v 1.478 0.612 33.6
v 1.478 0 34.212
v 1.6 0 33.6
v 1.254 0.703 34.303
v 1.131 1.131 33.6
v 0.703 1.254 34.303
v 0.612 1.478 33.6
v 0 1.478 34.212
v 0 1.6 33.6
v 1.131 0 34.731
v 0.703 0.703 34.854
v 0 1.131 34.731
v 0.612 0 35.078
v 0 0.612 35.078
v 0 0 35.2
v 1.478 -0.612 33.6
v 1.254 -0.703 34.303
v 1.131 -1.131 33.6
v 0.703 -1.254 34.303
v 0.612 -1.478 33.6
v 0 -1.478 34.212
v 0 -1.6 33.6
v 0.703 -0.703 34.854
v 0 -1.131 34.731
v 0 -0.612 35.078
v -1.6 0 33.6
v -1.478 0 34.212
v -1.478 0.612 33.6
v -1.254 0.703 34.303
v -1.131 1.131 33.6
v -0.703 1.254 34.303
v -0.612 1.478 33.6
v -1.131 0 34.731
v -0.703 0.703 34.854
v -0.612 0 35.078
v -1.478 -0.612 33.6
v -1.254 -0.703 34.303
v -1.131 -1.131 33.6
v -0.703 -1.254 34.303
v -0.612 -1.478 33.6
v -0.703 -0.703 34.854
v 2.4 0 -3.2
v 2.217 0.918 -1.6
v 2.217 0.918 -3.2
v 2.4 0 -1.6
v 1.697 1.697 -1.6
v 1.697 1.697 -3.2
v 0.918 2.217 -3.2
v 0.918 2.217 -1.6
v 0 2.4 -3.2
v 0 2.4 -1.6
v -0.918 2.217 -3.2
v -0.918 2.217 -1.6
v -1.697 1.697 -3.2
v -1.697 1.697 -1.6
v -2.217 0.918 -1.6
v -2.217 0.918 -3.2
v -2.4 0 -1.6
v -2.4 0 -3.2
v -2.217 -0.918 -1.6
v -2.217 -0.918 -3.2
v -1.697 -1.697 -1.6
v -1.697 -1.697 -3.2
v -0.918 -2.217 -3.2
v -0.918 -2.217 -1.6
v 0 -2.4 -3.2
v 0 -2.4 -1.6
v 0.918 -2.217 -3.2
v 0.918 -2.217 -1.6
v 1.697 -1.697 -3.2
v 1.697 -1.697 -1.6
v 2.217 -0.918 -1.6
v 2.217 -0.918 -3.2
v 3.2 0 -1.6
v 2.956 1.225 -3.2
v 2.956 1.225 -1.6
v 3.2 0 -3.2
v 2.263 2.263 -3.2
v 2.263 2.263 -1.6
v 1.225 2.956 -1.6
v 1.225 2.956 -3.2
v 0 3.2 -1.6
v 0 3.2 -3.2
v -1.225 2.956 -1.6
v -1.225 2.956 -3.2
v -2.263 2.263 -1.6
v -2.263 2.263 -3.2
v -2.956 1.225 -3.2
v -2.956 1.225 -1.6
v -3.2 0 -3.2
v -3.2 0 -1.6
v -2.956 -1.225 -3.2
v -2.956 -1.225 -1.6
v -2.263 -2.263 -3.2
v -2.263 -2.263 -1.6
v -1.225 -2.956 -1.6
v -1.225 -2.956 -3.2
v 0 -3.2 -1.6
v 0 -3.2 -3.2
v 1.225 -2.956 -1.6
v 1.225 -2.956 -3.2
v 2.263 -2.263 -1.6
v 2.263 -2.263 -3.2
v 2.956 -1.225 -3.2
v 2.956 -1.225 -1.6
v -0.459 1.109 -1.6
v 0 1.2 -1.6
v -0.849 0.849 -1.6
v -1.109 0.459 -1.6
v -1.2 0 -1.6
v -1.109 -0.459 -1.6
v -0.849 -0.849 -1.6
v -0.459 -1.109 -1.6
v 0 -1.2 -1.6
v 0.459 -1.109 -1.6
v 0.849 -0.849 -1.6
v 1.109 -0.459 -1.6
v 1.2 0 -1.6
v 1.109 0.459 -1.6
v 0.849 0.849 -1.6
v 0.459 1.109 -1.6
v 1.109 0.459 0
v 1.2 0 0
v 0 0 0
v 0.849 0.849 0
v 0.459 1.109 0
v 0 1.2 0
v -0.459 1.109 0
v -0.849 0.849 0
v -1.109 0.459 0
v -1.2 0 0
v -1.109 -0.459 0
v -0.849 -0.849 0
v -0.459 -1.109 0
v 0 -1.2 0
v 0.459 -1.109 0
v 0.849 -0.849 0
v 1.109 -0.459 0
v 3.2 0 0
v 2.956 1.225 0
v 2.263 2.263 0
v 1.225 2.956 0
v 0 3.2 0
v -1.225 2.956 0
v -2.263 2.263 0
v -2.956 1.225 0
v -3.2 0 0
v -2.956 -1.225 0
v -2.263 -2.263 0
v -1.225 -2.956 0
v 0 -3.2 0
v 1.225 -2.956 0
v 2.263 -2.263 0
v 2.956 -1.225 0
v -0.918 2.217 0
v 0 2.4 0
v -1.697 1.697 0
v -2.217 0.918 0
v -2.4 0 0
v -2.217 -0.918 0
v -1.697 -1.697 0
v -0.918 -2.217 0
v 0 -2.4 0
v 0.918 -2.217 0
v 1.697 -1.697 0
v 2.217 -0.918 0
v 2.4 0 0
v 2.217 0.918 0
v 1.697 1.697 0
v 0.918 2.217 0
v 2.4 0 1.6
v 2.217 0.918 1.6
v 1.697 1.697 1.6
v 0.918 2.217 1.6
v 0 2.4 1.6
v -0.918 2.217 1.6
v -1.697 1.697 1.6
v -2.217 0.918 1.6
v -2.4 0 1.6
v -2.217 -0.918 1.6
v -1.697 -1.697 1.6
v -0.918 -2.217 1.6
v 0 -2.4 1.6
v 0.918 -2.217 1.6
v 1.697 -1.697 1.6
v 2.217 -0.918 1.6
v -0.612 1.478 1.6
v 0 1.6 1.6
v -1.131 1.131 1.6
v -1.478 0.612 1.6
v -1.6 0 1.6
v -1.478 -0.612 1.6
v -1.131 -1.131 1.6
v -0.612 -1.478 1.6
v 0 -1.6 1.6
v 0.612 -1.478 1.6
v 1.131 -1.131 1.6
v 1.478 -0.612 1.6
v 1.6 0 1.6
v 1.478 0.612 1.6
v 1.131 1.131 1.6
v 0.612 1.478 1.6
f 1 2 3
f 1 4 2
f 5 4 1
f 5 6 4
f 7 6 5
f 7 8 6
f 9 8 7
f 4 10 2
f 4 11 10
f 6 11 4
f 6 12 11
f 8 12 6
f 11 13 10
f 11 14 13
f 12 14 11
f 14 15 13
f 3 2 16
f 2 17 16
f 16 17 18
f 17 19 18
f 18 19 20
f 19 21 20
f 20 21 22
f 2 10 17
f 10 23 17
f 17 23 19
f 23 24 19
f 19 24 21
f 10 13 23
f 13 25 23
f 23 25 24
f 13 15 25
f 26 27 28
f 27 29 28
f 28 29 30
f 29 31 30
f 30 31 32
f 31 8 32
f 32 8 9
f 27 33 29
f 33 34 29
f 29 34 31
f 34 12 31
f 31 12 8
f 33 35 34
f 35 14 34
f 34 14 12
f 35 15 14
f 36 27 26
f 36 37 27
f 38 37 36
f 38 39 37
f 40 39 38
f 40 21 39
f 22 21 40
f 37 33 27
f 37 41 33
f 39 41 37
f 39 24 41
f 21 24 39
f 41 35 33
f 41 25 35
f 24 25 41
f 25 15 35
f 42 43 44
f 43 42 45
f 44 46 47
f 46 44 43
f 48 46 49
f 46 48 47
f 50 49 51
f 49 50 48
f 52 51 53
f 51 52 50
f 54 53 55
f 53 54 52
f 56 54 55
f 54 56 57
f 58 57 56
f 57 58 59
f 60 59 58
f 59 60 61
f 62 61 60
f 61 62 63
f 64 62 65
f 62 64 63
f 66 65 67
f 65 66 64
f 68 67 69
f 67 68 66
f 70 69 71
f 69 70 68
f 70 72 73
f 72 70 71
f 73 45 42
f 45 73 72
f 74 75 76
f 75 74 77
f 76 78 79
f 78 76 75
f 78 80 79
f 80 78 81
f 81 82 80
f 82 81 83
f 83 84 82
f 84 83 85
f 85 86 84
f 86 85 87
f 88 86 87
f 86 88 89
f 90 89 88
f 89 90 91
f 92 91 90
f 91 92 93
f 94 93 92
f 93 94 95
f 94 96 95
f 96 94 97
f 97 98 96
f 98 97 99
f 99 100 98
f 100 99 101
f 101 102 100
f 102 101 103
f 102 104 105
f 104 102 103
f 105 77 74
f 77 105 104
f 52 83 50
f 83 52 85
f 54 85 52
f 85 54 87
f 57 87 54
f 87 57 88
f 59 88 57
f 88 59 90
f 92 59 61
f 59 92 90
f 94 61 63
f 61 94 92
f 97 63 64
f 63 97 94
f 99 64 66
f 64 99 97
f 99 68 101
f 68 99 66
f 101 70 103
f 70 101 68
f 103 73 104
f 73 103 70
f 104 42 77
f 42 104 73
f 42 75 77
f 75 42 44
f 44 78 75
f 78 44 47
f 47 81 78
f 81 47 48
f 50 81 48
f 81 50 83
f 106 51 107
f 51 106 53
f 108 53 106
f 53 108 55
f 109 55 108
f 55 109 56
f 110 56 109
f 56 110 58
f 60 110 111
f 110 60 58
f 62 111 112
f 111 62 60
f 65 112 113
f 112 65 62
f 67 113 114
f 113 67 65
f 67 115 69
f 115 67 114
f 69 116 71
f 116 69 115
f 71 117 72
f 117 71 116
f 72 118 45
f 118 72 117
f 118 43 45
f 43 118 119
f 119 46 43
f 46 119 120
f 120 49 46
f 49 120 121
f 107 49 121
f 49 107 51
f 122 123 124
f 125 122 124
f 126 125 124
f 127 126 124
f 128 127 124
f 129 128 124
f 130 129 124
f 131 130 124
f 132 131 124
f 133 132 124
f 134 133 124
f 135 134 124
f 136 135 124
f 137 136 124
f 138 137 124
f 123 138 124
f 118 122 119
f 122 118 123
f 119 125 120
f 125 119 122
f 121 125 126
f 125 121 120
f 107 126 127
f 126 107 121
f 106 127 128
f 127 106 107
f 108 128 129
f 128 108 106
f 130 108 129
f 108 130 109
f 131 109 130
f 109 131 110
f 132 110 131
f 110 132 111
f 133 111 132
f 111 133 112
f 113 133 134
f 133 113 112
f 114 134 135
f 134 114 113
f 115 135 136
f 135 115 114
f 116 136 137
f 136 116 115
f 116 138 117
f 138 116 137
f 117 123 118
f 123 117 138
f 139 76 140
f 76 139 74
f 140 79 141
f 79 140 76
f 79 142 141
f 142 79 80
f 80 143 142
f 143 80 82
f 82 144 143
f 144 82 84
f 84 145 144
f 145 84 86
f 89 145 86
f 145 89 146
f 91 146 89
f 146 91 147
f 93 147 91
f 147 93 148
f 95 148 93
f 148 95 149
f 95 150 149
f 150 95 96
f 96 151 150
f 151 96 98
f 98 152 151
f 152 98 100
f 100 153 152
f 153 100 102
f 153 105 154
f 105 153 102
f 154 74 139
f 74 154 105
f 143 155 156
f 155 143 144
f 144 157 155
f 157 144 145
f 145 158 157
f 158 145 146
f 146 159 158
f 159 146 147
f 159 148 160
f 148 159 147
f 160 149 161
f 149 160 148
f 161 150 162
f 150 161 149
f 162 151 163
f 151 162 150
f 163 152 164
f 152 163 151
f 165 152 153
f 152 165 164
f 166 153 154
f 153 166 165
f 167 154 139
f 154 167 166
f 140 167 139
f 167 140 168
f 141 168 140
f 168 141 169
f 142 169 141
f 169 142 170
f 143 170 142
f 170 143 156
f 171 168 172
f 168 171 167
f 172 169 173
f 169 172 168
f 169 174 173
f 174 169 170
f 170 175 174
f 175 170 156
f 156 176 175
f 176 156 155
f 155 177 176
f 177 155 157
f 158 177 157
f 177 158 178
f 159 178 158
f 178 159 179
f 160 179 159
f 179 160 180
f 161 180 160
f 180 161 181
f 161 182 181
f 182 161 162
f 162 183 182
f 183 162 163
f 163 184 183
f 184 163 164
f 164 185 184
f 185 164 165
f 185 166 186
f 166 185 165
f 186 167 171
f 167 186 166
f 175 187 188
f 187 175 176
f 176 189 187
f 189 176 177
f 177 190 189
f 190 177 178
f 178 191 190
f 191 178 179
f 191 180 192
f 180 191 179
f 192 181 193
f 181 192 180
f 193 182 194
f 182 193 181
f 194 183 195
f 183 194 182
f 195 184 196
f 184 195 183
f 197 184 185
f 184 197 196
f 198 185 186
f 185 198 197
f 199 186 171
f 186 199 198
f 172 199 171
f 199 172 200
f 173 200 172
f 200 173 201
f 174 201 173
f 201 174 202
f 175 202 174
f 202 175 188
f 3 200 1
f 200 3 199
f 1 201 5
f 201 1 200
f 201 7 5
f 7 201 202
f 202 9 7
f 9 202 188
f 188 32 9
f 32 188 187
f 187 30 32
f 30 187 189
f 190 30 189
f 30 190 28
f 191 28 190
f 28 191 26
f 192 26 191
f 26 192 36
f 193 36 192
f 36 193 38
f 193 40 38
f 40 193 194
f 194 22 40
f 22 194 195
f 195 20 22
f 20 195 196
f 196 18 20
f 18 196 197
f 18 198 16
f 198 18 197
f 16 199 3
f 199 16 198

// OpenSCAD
// file: ../p/1-8sphe.scad
use <../lib.scad>
function ldraw_lib__1_8sphe() = [
// 0 Sphere 0.125
// 0 Name: 1-8sphe.dat
// 0 Author: James Jessiman
// 0 !LDRAW_ORG Primitive UPDATE 2012-03
// 0 !LICENSE Licensed under CC BY 2.0 and CC BY 4.0 : see CAreadme.txt
// 
// 0 BFC CERTIFY CCW
  [0,"BFC","CERTIFY"],
  [0,"BFC","CCW"],
// 
// 0 !HISTORY 2000-08-01 {Axel Poque} fixes to resolve L3P error messages.
// 0 !HISTORY 2000-08-01 {Manfred Moolhuysen} fixes to resolve L3P error messages.
// 0 !HISTORY 2000-09-30 [PTadmin] Official Update 2000-02
// 0 !HISTORY 2002-03-28 [hafhead] Made BFC compliant
// 0 !HISTORY 2002-04-25 [PTadmin] Official Update 2002-02
// 0 !HISTORY 2007-06-22 [PTadmin] Header formatted for Contributor Agreement
// 0 !HISTORY 2008-07-01 [PTadmin] Official Update 2008-01
// 0 !HISTORY 2010-09-12 [MagFors] Changed winding, removed duplicated cond-line, optimized filesize
// 0 !HISTORY 2010-12-31 [PTadmin] Official Update 2010-03
// 0 !HISTORY 2012-07-01 [tcobbs] Replaced with geometry from LDView
// 0 !HISTORY 2012-12-28 [PTadmin] Official Update 2012-03
// 
// 
// 3 16 1 0 0 0.9239 0.3827 0 0.9239 0 0.3827
  [3,16,1,0,0,0.9239,0.3827,0,0.9239,0,0.3827],
// 3 16 0.9239 0.3827 0 0.7836 0.4393 0.4393 0.9239 0 0.3827
  [3,16,0.9239,0.3827,0,0.7836,0.4393,0.4393,0.9239,0,0.3827],
// 3 16 0.9239 0 0.3827 0.7836 0.4393 0.4393 0.7071 0 0.7071
  [3,16,0.9239,0,0.3827,0.7836,0.4393,0.4393,0.7071,0,0.7071],
// 3 16 0.7836 0.4393 0.4393 0.4393 0.4393 0.7836 0.7071 0 0.7071
  [3,16,0.7836,0.4393,0.4393,0.4393,0.4393,0.7836,0.7071,0,0.7071],
// 3 16 0.7071 0 0.7071 0.4393 0.4393 0.7836 0.3827 0 0.9239
  [3,16,0.7071,0,0.7071,0.4393,0.4393,0.7836,0.3827,0,0.9239],
// 3 16 0.4393 0.4393 0.7836 0 0.3827 0.9239 0.3827 0 0.9239
  [3,16,0.4393,0.4393,0.7836,0,0.3827,0.9239,0.3827,0,0.9239],
// 3 16 0.3827 0 0.9239 0 0.3827 0.9239 0 0 1
  [3,16,0.3827,0,0.9239,0,0.3827,0.9239,0,0,1],
// 3 16 0.9239 0.3827 0 0.7071 0.7071 0 0.7836 0.4393 0.4393
  [3,16,0.9239,0.3827,0,0.7071,0.7071,0,0.7836,0.4393,0.4393],
// 3 16 0.7071 0.7071 0 0.4393 0.7836 0.4393 0.7836 0.4393 0.4393
  [3,16,0.7071,0.7071,0,0.4393,0.7836,0.4393,0.7836,0.4393,0.4393],
// 3 16 0.7836 0.4393 0.4393 0.4393 0.7836 0.4393 0.4393 0.4393 0.7836
  [3,16,0.7836,0.4393,0.4393,0.4393,0.7836,0.4393,0.4393,0.4393,0.7836],
// 3 16 0.4393 0.7836 0.4393 0 0.7071 0.7071 0.4393 0.4393 0.7836
  [3,16,0.4393,0.7836,0.4393,0,0.7071,0.7071,0.4393,0.4393,0.7836],
// 3 16 0.4393 0.4393 0.7836 0 0.7071 0.7071 0 0.3827 0.9239
  [3,16,0.4393,0.4393,0.7836,0,0.7071,0.7071,0,0.3827,0.9239],
// 3 16 0.7071 0.7071 0 0.3827 0.9239 0 0.4393 0.7836 0.4393
  [3,16,0.7071,0.7071,0,0.3827,0.9239,0,0.4393,0.7836,0.4393],
// 3 16 0.3827 0.9239 0 0 0.9239 0.3827 0.4393 0.7836 0.4393
  [3,16,0.3827,0.9239,0,0,0.9239,0.3827,0.4393,0.7836,0.4393],
// 3 16 0.4393 0.7836 0.4393 0 0.9239 0.3827 0 0.7071 0.7071
  [3,16,0.4393,0.7836,0.4393,0,0.9239,0.3827,0,0.7071,0.7071],
// 3 16 0.3827 0.9239 0 0 1 0 0 0.9239 0.3827
  [3,16,0.3827,0.9239,0,0,1,0,0,0.9239,0.3827],
// 
// 5 24 1 0 0 0.9239 0.3827 0 1 0 -0.1 0.9239 0 0.3827
  [5,24,1,0,0,0.9239,0.3827,0,1,0,-0.1,0.9239,0,0.3827],
// 5 24 0.9239 0.3827 0 0.9239 0 0.3827 1 0 0 0.7836 0.4393 0.4393
  [5,24,0.9239,0.3827,0,0.9239,0,0.3827,1,0,0,0.7836,0.4393,0.4393],
// 5 24 1 0 0 0.9239 0 0.3827 0.9239 0.3827 0 1 -0.1 0
  [5,24,1,0,0,0.9239,0,0.3827,0.9239,0.3827,0,1,-0.1,0],
// 5 24 0.9239 0 0.3827 0.7836 0.4393 0.4393 0.9239 0.3827 0 0.7071 0 0.7071
  [5,24,0.9239,0,0.3827,0.7836,0.4393,0.4393,0.9239,0.3827,0,0.7071,0,0.7071],
// 5 24 0.7836 0.4393 0.4393 0.7071 0 0.7071 0.9239 0 0.3827 0.4393 0.4393 0.7836
  [5,24,0.7836,0.4393,0.4393,0.7071,0,0.7071,0.9239,0,0.3827,0.4393,0.4393,0.7836],
// 5 24 0.9239 0 0.3827 0.7071 0 0.7071 0.7836 0.4393 0.4393 0.9239 -0.1 0.3827
  [5,24,0.9239,0,0.3827,0.7071,0,0.7071,0.7836,0.4393,0.4393,0.9239,-0.1,0.3827],
// 5 24 0.7071 0 0.7071 0.4393 0.4393 0.7836 0.7836 0.4393 0.4393 0.3827 0 0.9239
  [5,24,0.7071,0,0.7071,0.4393,0.4393,0.7836,0.7836,0.4393,0.4393,0.3827,0,0.9239],
// 5 24 0.4393 0.4393 0.7836 0.3827 0 0.9239 0.7071 0 0.7071 0 0.3827 0.9239
  [5,24,0.4393,0.4393,0.7836,0.3827,0,0.9239,0.7071,0,0.7071,0,0.3827,0.9239],
// 5 24 0.7071 0 0.7071 0.3827 0 0.9239 0.4393 0.4393 0.7836 0.7071 -0.1 0.7071
  [5,24,0.7071,0,0.7071,0.3827,0,0.9239,0.4393,0.4393,0.7836,0.7071,-0.1,0.7071],
// 5 24 0.3827 0 0.9239 0 0.3827 0.9239 0.4393 0.4393 0.7836 0 0 1
  [5,24,0.3827,0,0.9239,0,0.3827,0.9239,0.4393,0.4393,0.7836,0,0,1],
// 5 24 0 0.3827 0.9239 0 0 1 0.3827 0 0.9239 -0.1 0.3827 0.9239
  [5,24,0,0.3827,0.9239,0,0,1,0.3827,0,0.9239,-0.1,0.3827,0.9239],
// 5 24 0.3827 0 0.9239 0 0 1 0 0.3827 0.9239 0.3827 -0.1 0.9239
  [5,24,0.3827,0,0.9239,0,0,1,0,0.3827,0.9239,0.3827,-0.1,0.9239],
// 5 24 0.9239 0.3827 0 0.7071 0.7071 0 0.9239 0.3827 -0.1 0.7836 0.4393 0.4393
  [5,24,0.9239,0.3827,0,0.7071,0.7071,0,0.9239,0.3827,-0.1,0.7836,0.4393,0.4393],
// 5 24 0.7071 0.7071 0 0.7836 0.4393 0.4393 0.9239 0.3827 0 0.4393 0.7836 0.4393
  [5,24,0.7071,0.7071,0,0.7836,0.4393,0.4393,0.9239,0.3827,0,0.4393,0.7836,0.4393],
// 5 24 0.9239 0.3827 0 0.7836 0.4393 0.4393 0.7071 0.7071 0 0.9239 0 0.3827
  [5,24,0.9239,0.3827,0,0.7836,0.4393,0.4393,0.7071,0.7071,0,0.9239,0,0.3827],
// 5 24 0.7836 0.4393 0.4393 0.4393 0.7836 0.4393 0.7071 0.7071 0 0.4393 0.4393 0.7836
  [5,24,0.7836,0.4393,0.4393,0.4393,0.7836,0.4393,0.7071,0.7071,0,0.4393,0.4393,0.7836],
// 5 24 0.4393 0.7836 0.4393 0.4393 0.4393 0.7836 0.7836 0.4393 0.4393 0 0.7071 0.7071
  [5,24,0.4393,0.7836,0.4393,0.4393,0.4393,0.7836,0.7836,0.4393,0.4393,0,0.7071,0.7071],
// 5 24 0.7836 0.4393 0.4393 0.4393 0.4393 0.7836 0.4393 0.7836 0.4393 0.7071 0 0.7071
  [5,24,0.7836,0.4393,0.4393,0.4393,0.4393,0.7836,0.4393,0.7836,0.4393,0.7071,0,0.7071],
// 5 24 0.4393 0.4393 0.7836 0 0.7071 0.7071 0.4393 0.7836 0.4393 0 0.3827 0.9239
  [5,24,0.4393,0.4393,0.7836,0,0.7071,0.7071,0.4393,0.7836,0.4393,0,0.3827,0.9239],
// 5 24 0 0.7071 0.7071 0 0.3827 0.9239 0.4393 0.4393 0.7836 -0.1 0.7071 0.7071
  [5,24,0,0.7071,0.7071,0,0.3827,0.9239,0.4393,0.4393,0.7836,-0.1,0.7071,0.7071],
// 5 24 0.4393 0.4393 0.7836 0 0.3827 0.9239 0 0.7071 0.7071 0.3827 0 0.9239
  [5,24,0.4393,0.4393,0.7836,0,0.3827,0.9239,0,0.7071,0.7071,0.3827,0,0.9239],
// 5 24 0.7071 0.7071 0 0.3827 0.9239 0 0.7071 0.7071 -0.1 0.4393 0.7836 0.4393
  [5,24,0.7071,0.7071,0,0.3827,0.9239,0,0.7071,0.7071,-0.1,0.4393,0.7836,0.4393],
// 5 24 0.3827 0.9239 0 0.4393 0.7836 0.4393 0.7071 0.7071 0 0 0.9239 0.3827
  [5,24,0.3827,0.9239,0,0.4393,0.7836,0.4393,0.7071,0.7071,0,0,0.9239,0.3827],
// 5 24 0.7071 0.7071 0 0.4393 0.7836 0.4393 0.3827 0.9239 0 0.7836 0.4393 0.4393
  [5,24,0.7071,0.7071,0,0.4393,0.7836,0.4393,0.3827,0.9239,0,0.7836,0.4393,0.4393],
// 5 24 0.4393 0.7836 0.4393 0 0.9239 0.3827 0.3827 0.9239 0 0 0.7071 0.7071
  [5,24,0.4393,0.7836,0.4393,0,0.9239,0.3827,0.3827,0.9239,0,0,0.7071,0.7071],
// 5 24 0 0.9239 0.3827 0 0.7071 0.7071 0.4393 0.7836 0.4393 -0.1 0.9239 0.3827
  [5,24,0,0.9239,0.3827,0,0.7071,0.7071,0.4393,0.7836,0.4393,-0.1,0.9239,0.3827],
// 5 24 0.4393 0.7836 0.4393 0 0.7071 0.7071 0 0.9239 0.3827 0.4393 0.4393 0.7836
  [5,24,0.4393,0.7836,0.4393,0,0.7071,0.7071,0,0.9239,0.3827,0.4393,0.4393,0.7836],
// 5 24 0.3827 0.9239 0 0 1 0 0.3827 0.9239 -0.1 0 0.9239 0.3827
  [5,24,0.3827,0.9239,0,0,1,0,0.3827,0.9239,-0.1,0,0.9239,0.3827],
// 5 24 0 1 0 0 0.9239 0.3827 0.3827 0.9239 0 -0.1 1 0
  [5,24,0,1,0,0,0.9239,0.3827,0.3827,0.9239,0,-0.1,1,0],
// 5 24 0.3827 0.9239 0 0 0.9239 0.3827 0 1 0 0.4393 0.7836 0.4393
  [5,24,0.3827,0.9239,0,0,0.9239,0.3827,0,1,0,0.4393,0.7836,0.4393],
];
makepoly(ldraw_lib__1_8sphe(), line=0.2);
// file: ../p/4-4disc.scad
use <../lib.scad>
function ldraw_lib__4_4disc() = [
// 0 Disc 1.0
// 0 Name: 4-4disc.dat
// 0 Author: James Jessiman
// 0 !LDRAW_ORG Primitive UPDATE 2002-02
// 0 !LICENSE Licensed under CC BY 2.0 and CC BY 4.0 : see CAreadme.txt
// 
// 0 BFC CERTIFY CCW
  [0,"BFC","CERTIFY"],
  [0,"BFC","CCW"],
// 
// 0 !HISTORY 1998-12-15 [PTadmin] Official Update 1998-10
// 0 !HISTORY 2002-03-23 [sbliss] Added BFC statement
// 0 !HISTORY 2002-04-25 [PTadmin] Official Update 2002-02
// 0 !HISTORY 2007-06-24 [PTadmin] Header formatted for Contributor Agreement
// 0 !HISTORY 2008-07-01 [PTadmin] Official Update 2008-01
// 
// 
// 3 16 0 0 0 1 0 0 0.9239 0 0.3827
  [3,16,0,0,0,1,0,0,0.9239,0,0.3827],
// 3 16 0 0 0 0.9239 0 0.3827 0.7071 0 0.7071
  [3,16,0,0,0,0.9239,0,0.3827,0.7071,0,0.7071],
// 3 16 0 0 0 0.7071 0 0.7071 0.3827 0 0.9239
  [3,16,0,0,0,0.7071,0,0.7071,0.3827,0,0.9239],
// 3 16 0 0 0 0.3827 0 0.9239 0 0 1
  [3,16,0,0,0,0.3827,0,0.9239,0,0,1],
// 3 16 0 0 0 0 0 1 -0.3827 0 0.9239
  [3,16,0,0,0,0,0,1,-0.3827,0,0.9239],
// 3 16 0 0 0 -0.3827 0 0.9239 -0.7071 0 0.7071
  [3,16,0,0,0,-0.3827,0,0.9239,-0.7071,0,0.7071],
// 3 16 0 0 0 -0.7071 0 0.7071 -0.9239 0 0.3827
  [3,16,0,0,0,-0.7071,0,0.7071,-0.9239,0,0.3827],
// 3 16 0 0 0 -0.9239 0 0.3827 -1 0 -0
  [3,16,0,0,0,-0.9239,0,0.3827,-1,0,-0],
// 3 16 0 0 0 -1 0 -0 -0.9239 0 -0.3827
  [3,16,0,0,0,-1,0,-0,-0.9239,0,-0.3827],
// 3 16 0 0 0 -0.9239 0 -0.3827 -0.7071 0 -0.7071
  [3,16,0,0,0,-0.9239,0,-0.3827,-0.7071,0,-0.7071],
// 3 16 0 0 0 -0.7071 0 -0.7071 -0.3827 0 -0.9239
  [3,16,0,0,0,-0.7071,0,-0.7071,-0.3827,0,-0.9239],
// 3 16 0 0 0 -0.3827 0 -0.9239 0 0 -1
  [3,16,0,0,0,-0.3827,0,-0.9239,0,0,-1],
// 3 16 0 0 0 0 0 -1 0.3827 0 -0.9239
  [3,16,0,0,0,0,0,-1,0.3827,0,-0.9239],
// 3 16 0 0 0 0.3827 0 -0.9239 0.7071 0 -0.7071
  [3,16,0,0,0,0.3827,0,-0.9239,0.7071,0,-0.7071],
// 3 16 0 0 0 0.7071 0 -0.7071 0.9239 0 -0.3827
  [3,16,0,0,0,0.7071,0,-0.7071,0.9239,0,-0.3827],
// 3 16 0 0 0 0.9239 0 -0.3827 1 0 0
  [3,16,0,0,0,0.9239,0,-0.3827,1,0,0],
// 0
];
makepoly(ldraw_lib__4_4disc(), line=0.2);
// file: ../p/stud4a.scad
use <../lib.scad>
use <4-4cyli.scad>
use <4-4edge.scad>
use <4-4ring3.scad>
function ldraw_lib__stud4a() = [
// 0 Stud Tube Open without Base Edges
// 0 Name: stud4a.dat
// 0 Author: James Jessiman
// 0 !LDRAW_ORG Primitive UPDATE 2009-02
// 0 !LICENSE Licensed under CC BY 2.0 and CC BY 4.0 : see CAreadme.txt
// 
// 0 BFC CERTIFY CCW
  [0,"BFC","CERTIFY"],
  [0,"BFC","CCW"],
// 
// 0 !HISTORY 1999-07-05 [PTadmin] Official Update 1999-05
// 0 !HISTORY 2002-04-04 [sbliss] Modified for BFC compliance
// 0 !HISTORY 2002-04-25 [PTadmin] Official Update 2002-02
// 0 !HISTORY 2007-06-24 [PTadmin] Header formatted for Contributor Agreement
// 0 !HISTORY 2008-07-01 [PTadmin] Official Update 2008-01
// 0 !HISTORY 2009-06-21 [cwdee] Update ring references to 4-4ring
// 0 !HISTORY 2009-09-03 [PTadmin] Official Update 2009-02
// 
// 
// 1 16 0 -4 0 6 0 0 0 1 0 0 0 6 4-4edge.dat
  [1,16,0,-4,0,6,0,0,0,1,0,0,0,6, ldraw_lib__4_4edge()],
// 1 16 0 -4 0 8 0 0 0 1 0 0 0 8 4-4edge.dat
  [1,16,0,-4,0,8,0,0,0,1,0,0,0,8, ldraw_lib__4_4edge()],
// 0 BFC INVERTNEXT
  [0,"BFC","INVERTNEXT"],
// 1 16 0 -4 0 6 0 0 0 4 0 0 0 6 4-4cyli.dat
  [1,16,0,-4,0,6,0,0,0,4,0,0,0,6, ldraw_lib__4_4cyli()],
// 1 16 0 -4 0 8 0 0 0 4 0 0 0 8 4-4cyli.dat
  [1,16,0,-4,0,8,0,0,0,4,0,0,0,8, ldraw_lib__4_4cyli()],
// 1 16 0 -4 0 2 0 0 0 1 0 0 0 2 4-4ring3.dat
  [1,16,0,-4,0,2,0,0,0,1,0,0,0,2, ldraw_lib__4_4ring3()],
// 0
];
makepoly(ldraw_lib__stud4a(), line=0.2);
// file: ../p/4-8sphe.scad
use <../lib.scad>
use <1-8sphe.scad>
function ldraw_lib__4_8sphe() = [
// 0 Sphere 0.5
// 0 Name: 4-8sphe.dat
// 0 Author: James Jessiman
// 0 !LDRAW_ORG Primitive UPDATE 2003-02
// 0 !LICENSE Licensed under CC BY 2.0 and CC BY 4.0 : see CAreadme.txt
// 
// 0 BFC CERTIFY CCW
  [0,"BFC","CERTIFY"],
  [0,"BFC","CCW"],
// 
// 0 !HISTORY 2002-08-31 [izanette] Modified with WINDZ for BFC compliance
// 0 !HISTORY 2003-08-01 [PTadmin] Official Update 2003-02
// 0 !HISTORY 2007-06-24 [PTadmin] Header formatted for Contributor Agreement
// 0 !HISTORY 2008-07-01 [PTadmin] Official Update 2008-01
// 
// 
// 1 16 0 0 0 1 0 0 0 1 0 0 0 1 1-8sphe.dat
  [1,16,0,0,0,1,0,0,0,1,0,0,0,1, ldraw_lib__1_8sphe()],
// 1 16 0 0 0 1 0 0 0 1 0 0 0 -1 1-8sphe.dat
  [1,16,0,0,0,1,0,0,0,1,0,0,0,-1, ldraw_lib__1_8sphe()],
// 1 16 0 0 0 -1 0 0 0 1 0 0 0 1 1-8sphe.dat
  [1,16,0,0,0,-1,0,0,0,1,0,0,0,1, ldraw_lib__1_8sphe()],
// 1 16 0 0 0 -1 0 0 0 1 0 0 0 -1 1-8sphe.dat
  [1,16,0,0,0,-1,0,0,0,1,0,0,0,-1, ldraw_lib__1_8sphe()],
// 0
// 
];
makepoly(ldraw_lib__4_8sphe(), line=0.2);
// file: ../p/4-4ring3.scad
use <../lib.scad>
function ldraw_lib__4_4ring3() = [
// 0 Ring  3 x 1.0
// 0 Name: 4-4ring3.dat
// 0 Author: James Jessiman
// 0 !LDRAW_ORG Primitive UPDATE 2009-01
// 0 !LICENSE Licensed under CC BY 2.0 and CC BY 4.0 : see CAreadme.txt
// 
// 0 BFC CERTIFY CCW
  [0,"BFC","CERTIFY"],
  [0,"BFC","CCW"],
// 
// 0 !HISTORY 1998-12-15 [PTadmin] Official Update 1998-10
// 0 !HISTORY 2002-04-05 [hafhead] Added BFC statement
// 0 !HISTORY 2002-04-25 [PTadmin] Official Update 2002-02
// 0 !HISTORY 2007-06-24 [PTadmin] Header formatted for Contributor Agreement
// 0 !HISTORY 2008-07-01 [PTadmin] Official Update 2008-01
// 0 !HISTORY 2008-08-26 [cwdee] Switch polygon winding and rename
// 0 !HISTORY 2009-05-02 [PTadmin] Official Update 2009-01
// 
// 
// 4 16 -1.5308 0 3.6956 -1.1481 0 2.7717 0 0 3 0 0 4
  [4,16,-1.5308,0,3.6956,-1.1481,0,2.7717,0,0,3,0,0,4],
// 4 16 -2.8284 0 2.8284 -2.1213 0 2.1213 -1.1481 0 2.7717 -1.5308 0 3.6956
  [4,16,-2.8284,0,2.8284,-2.1213,0,2.1213,-1.1481,0,2.7717,-1.5308,0,3.6956],
// 4 16 -3.6956 0 1.5308 -2.7717 0 1.1481 -2.1213 0 2.1213 -2.8284 0 2.8284
  [4,16,-3.6956,0,1.5308,-2.7717,0,1.1481,-2.1213,0,2.1213,-2.8284,0,2.8284],
// 4 16 -4 0 0 -3 0 0 -2.7717 0 1.1481 -3.6956 0 1.5308
  [4,16,-4,0,0,-3,0,0,-2.7717,0,1.1481,-3.6956,0,1.5308],
// 4 16 -3.6956 0 -1.5308 -2.7717 0 -1.1481 -3 0 0 -4 0 0
  [4,16,-3.6956,0,-1.5308,-2.7717,0,-1.1481,-3,0,0,-4,0,0],
// 4 16 -2.8284 0 -2.8284 -2.1213 0 -2.1213 -2.7717 0 -1.1481 -3.6956 0 -1.5308
  [4,16,-2.8284,0,-2.8284,-2.1213,0,-2.1213,-2.7717,0,-1.1481,-3.6956,0,-1.5308],
// 4 16 -1.5308 0 -3.6956 -1.1481 0 -2.7717 -2.1213 0 -2.1213 -2.8284 0 -2.8284
  [4,16,-1.5308,0,-3.6956,-1.1481,0,-2.7717,-2.1213,0,-2.1213,-2.8284,0,-2.8284],
// 4 16 0 0 -4 0 0 -3 -1.1481 0 -2.7717 -1.5308 0 -3.6956
  [4,16,0,0,-4,0,0,-3,-1.1481,0,-2.7717,-1.5308,0,-3.6956],
// 4 16 1.5308 0 -3.6956 1.1481 0 -2.7717 0 0 -3 0 0 -4
  [4,16,1.5308,0,-3.6956,1.1481,0,-2.7717,0,0,-3,0,0,-4],
// 4 16 2.8284 0 -2.8284 2.1213 0 -2.1213 1.1481 0 -2.7717 1.5308 0 -3.6956
  [4,16,2.8284,0,-2.8284,2.1213,0,-2.1213,1.1481,0,-2.7717,1.5308,0,-3.6956],
// 4 16 3.6956 0 -1.5308 2.7717 0 -1.1481 2.1213 0 -2.1213 2.8284 0 -2.8284
  [4,16,3.6956,0,-1.5308,2.7717,0,-1.1481,2.1213,0,-2.1213,2.8284,0,-2.8284],
// 4 16 4 0 0 3 0 0 2.7717 0 -1.1481 3.6956 0 -1.5308
  [4,16,4,0,0,3,0,0,2.7717,0,-1.1481,3.6956,0,-1.5308],
// 4 16 3.6956 0 1.5308 2.7717 0 1.1481 3 0 0 4 0 0
  [4,16,3.6956,0,1.5308,2.7717,0,1.1481,3,0,0,4,0,0],
// 4 16 2.8284 0 2.8284 2.1213 0 2.1213 2.7717 0 1.1481 3.6956 0 1.5308
  [4,16,2.8284,0,2.8284,2.1213,0,2.1213,2.7717,0,1.1481,3.6956,0,1.5308],
// 4 16 1.5308 0 3.6956 1.1481 0 2.7717 2.1213 0 2.1213 2.8284 0 2.8284
  [4,16,1.5308,0,3.6956,1.1481,0,2.7717,2.1213,0,2.1213,2.8284,0,2.8284],
// 4 16 0 0 4 0 0 3 1.1481 0 2.7717 1.5308 0 3.6956
  [4,16,0,0,4,0,0,3,1.1481,0,2.7717,1.5308,0,3.6956],
// 0
];
makepoly(ldraw_lib__4_4ring3(), line=0.2);
// file: ../p/4-4ring2.scad
use <../lib.scad>
function ldraw_lib__4_4ring2() = [
// 0 Ring  2 x 1.0
// 0 Name: 4-4ring2.dat
// 0 Author: James Jessiman
// 0 !LDRAW_ORG Primitive UPDATE 2009-01
// 0 !LICENSE Licensed under CC BY 2.0 and CC BY 4.0 : see CAreadme.txt
// 
// 0 BFC CERTIFY CCW
  [0,"BFC","CERTIFY"],
  [0,"BFC","CCW"],
// 
// 0 !HISTORY 1998-12-15 [PTadmin] Official Update 1998-10
// 0 !HISTORY 2002-04-05 [hafhead] Added BFC statement
// 0 !HISTORY 2002-04-25 [PTadmin] Official Update 2002-02
// 0 !HISTORY 2007-06-24 [PTadmin] Header formatted for Contributor Agreement
// 0 !HISTORY 2008-07-01 [PTadmin] Official Update 2008-01
// 0 !HISTORY 2008-08-26 [cwdee] Switch polygon winding and rename
// 0 !HISTORY 2009-05-02 [PTadmin] Official Update 2009-01
// 
// 
// 4 16 -1.1481 0 2.7717 -0.7654 0 1.8478 0 0 2 0 0 3
  [4,16,-1.1481,0,2.7717,-0.7654,0,1.8478,0,0,2,0,0,3],
// 4 16 -2.1213 0 2.1213 -1.4142 0 1.4142 -0.7654 0 1.8478 -1.1481 0 2.7717
  [4,16,-2.1213,0,2.1213,-1.4142,0,1.4142,-0.7654,0,1.8478,-1.1481,0,2.7717],
// 4 16 -2.7717 0 1.1481 -1.8478 0 0.7654 -1.4142 0 1.4142 -2.1213 0 2.1213
  [4,16,-2.7717,0,1.1481,-1.8478,0,0.7654,-1.4142,0,1.4142,-2.1213,0,2.1213],
// 4 16 -3 0 0 -2 0 0 -1.8478 0 0.7654 -2.7717 0 1.1481
  [4,16,-3,0,0,-2,0,0,-1.8478,0,0.7654,-2.7717,0,1.1481],
// 4 16 -2.7717 0 -1.1481 -1.8478 0 -0.7654 -2 0 0 -3 0 0
  [4,16,-2.7717,0,-1.1481,-1.8478,0,-0.7654,-2,0,0,-3,0,0],
// 4 16 -2.1213 0 -2.1213 -1.4142 0 -1.4142 -1.8478 0 -0.7654 -2.7717 0 -1.1481
  [4,16,-2.1213,0,-2.1213,-1.4142,0,-1.4142,-1.8478,0,-0.7654,-2.7717,0,-1.1481],
// 4 16 -1.1481 0 -2.7717 -0.7654 0 -1.8478 -1.4142 0 -1.4142 -2.1213 0 -2.1213
  [4,16,-1.1481,0,-2.7717,-0.7654,0,-1.8478,-1.4142,0,-1.4142,-2.1213,0,-2.1213],
// 4 16 0 0 -3 0 0 -2 -0.7654 0 -1.8478 -1.1481 0 -2.7717
  [4,16,0,0,-3,0,0,-2,-0.7654,0,-1.8478,-1.1481,0,-2.7717],
// 4 16 1.1481 0 -2.7717 0.7654 0 -1.8478 0 0 -2 0 0 -3
  [4,16,1.1481,0,-2.7717,0.7654,0,-1.8478,0,0,-2,0,0,-3],
// 4 16 2.1213 0 -2.1213 1.4142 0 -1.4142 0.7654 0 -1.8478 1.1481 0 -2.7717
  [4,16,2.1213,0,-2.1213,1.4142,0,-1.4142,0.7654,0,-1.8478,1.1481,0,-2.7717],
// 4 16 2.7717 0 -1.1481 1.8478 0 -0.7654 1.4142 0 -1.4142 2.1213 0 -2.1213
  [4,16,2.7717,0,-1.1481,1.8478,0,-0.7654,1.4142,0,-1.4142,2.1213,0,-2.1213],
// 4 16 3 0 0 2 0 0 1.8478 0 -0.7654 2.7717 0 -1.1481
  [4,16,3,0,0,2,0,0,1.8478,0,-0.7654,2.7717,0,-1.1481],
// 4 16 2.7717 0 1.1481 1.8478 0 0.7654 2 0 0 3 0 0
  [4,16,2.7717,0,1.1481,1.8478,0,0.7654,2,0,0,3,0,0],
// 4 16 2.1213 0 2.1213 1.4142 0 1.4142 1.8478 0 0.7654 2.7717 0 1.1481
  [4,16,2.1213,0,2.1213,1.4142,0,1.4142,1.8478,0,0.7654,2.7717,0,1.1481],
// 4 16 1.1481 0 2.7717 0.7654 0 1.8478 1.4142 0 1.4142 2.1213 0 2.1213
  [4,16,1.1481,0,2.7717,0.7654,0,1.8478,1.4142,0,1.4142,2.1213,0,2.1213],
// 4 16 0 0 3 0 0 2 0.7654 0 1.8478 1.1481 0 2.7717
  [4,16,0,0,3,0,0,2,0.7654,0,1.8478,1.1481,0,2.7717],
// 0
];
makepoly(ldraw_lib__4_4ring2(), line=0.2);
// file: ../p/4-4ring1.scad
use <../lib.scad>
function ldraw_lib__4_4ring1() = [
// 0 Ring  1 x 1.0
// 0 Name: 4-4ring1.dat
// 0 Author: James Jessiman
// 0 !LDRAW_ORG Primitive UPDATE 2009-01
// 0 !LICENSE Licensed under CC BY 2.0 and CC BY 4.0 : see CAreadme.txt
// 
// 0 BFC CERTIFY CCW
  [0,"BFC","CERTIFY"],
  [0,"BFC","CCW"],
// 
// 0 !HISTORY 1998-12-15 [PTadmin] Official Update 1998-10
// 0 !HISTORY 2002-04-08 [BrickCaster] Modified for BFC compliance
// 0 !HISTORY 2002-04-25 [PTadmin] Official Update 2002-02
// 0 !HISTORY 2007-06-24 [PTadmin] Header formatted for Contributor Agreement
// 0 !HISTORY 2008-07-01 [PTadmin] Official Update 2008-01
// 0 !HISTORY 2008-08-26 [cwdee] Switch polygon winding and rename
// 0 !HISTORY 2009-05-02 [PTadmin] Official Update 2009-01
// 
// 
// 4 16 -0.7654 0 1.8478 -0.3827 0 0.9239 0 0 1 0 0 2
  [4,16,-0.7654,0,1.8478,-0.3827,0,0.9239,0,0,1,0,0,2],
// 4 16 -1.4142 0 1.4142 -0.7071 0 0.7071 -0.3827 0 0.9239 -0.7654 0 1.8478
  [4,16,-1.4142,0,1.4142,-0.7071,0,0.7071,-0.3827,0,0.9239,-0.7654,0,1.8478],
// 4 16 -1.8478 0 0.7654 -0.9239 0 0.3827 -0.7071 0 0.7071 -1.4142 0 1.41420
  [4,16,-1.8478,0,0.7654,-0.9239,0,0.3827,-0.7071,0,0.7071,-1.4142,0,1.41420],
// 4 16 -2 0 0 -1 0 0 -0.9239 0 0.3827 -1.8478 0 0.7654
  [4,16,-2,0,0,-1,0,0,-0.9239,0,0.3827,-1.8478,0,0.7654],
// 4 16 -1.8478 0 -0.7654 -0.9239 0 -0.3827 -1 0 0 -2 0 0
  [4,16,-1.8478,0,-0.7654,-0.9239,0,-0.3827,-1,0,0,-2,0,0],
// 4 16 -1.4142 0 -1.4142 -0.7071 0 -0.7071 -0.9239 0 -0.3827 -1.8478 0 -0.7654
  [4,16,-1.4142,0,-1.4142,-0.7071,0,-0.7071,-0.9239,0,-0.3827,-1.8478,0,-0.7654],
// 4 16 -0.7654 0 -1.8478 -0.3827 0 -0.9239 -0.7071 0 -0.7071 -1.4142 0 -1.4142
  [4,16,-0.7654,0,-1.8478,-0.3827,0,-0.9239,-0.7071,0,-0.7071,-1.4142,0,-1.4142],
// 4 16 0 0 -2 0 0 -1 -0.3827 0 -0.9239 -0.7654 0 -1.8478
  [4,16,0,0,-2,0,0,-1,-0.3827,0,-0.9239,-0.7654,0,-1.8478],
// 4 16 0.7654 0 -1.8478 0.3827 0 -0.9239 0 0 -1 0 0 -2
  [4,16,0.7654,0,-1.8478,0.3827,0,-0.9239,0,0,-1,0,0,-2],
// 4 16 1.4142 0 -1.4142 0.7071 0 -0.7071 0.3827 0 -0.9239 0.7654 0 -1.8478
  [4,16,1.4142,0,-1.4142,0.7071,0,-0.7071,0.3827,0,-0.9239,0.7654,0,-1.8478],
// 4 16 1.8478 0 -0.7654 0.9239 0 -0.3827 0.7071 0 -0.7071 1.4142 0 -1.4142
  [4,16,1.8478,0,-0.7654,0.9239,0,-0.3827,0.7071,0,-0.7071,1.4142,0,-1.4142],
// 4 16 2 0 0 1 0 0 0.9239 0 -0.3827 1.8478 0 -0.7654
  [4,16,2,0,0,1,0,0,0.9239,0,-0.3827,1.8478,0,-0.7654],
// 4 16 1.8478 0 0.7654 0.9239 0 0.3827 1 0 0 2 0 0
  [4,16,1.8478,0,0.7654,0.9239,0,0.3827,1,0,0,2,0,0],
// 4 16 1.4142 0 1.4142 0.7071 0 0.7071 0.9239 0 0.3827 1.8478 0 0.7654
  [4,16,1.4142,0,1.4142,0.7071,0,0.7071,0.9239,0,0.3827,1.8478,0,0.7654],
// 4 16 0.7654 0 1.8478 0.3827 0 0.9239 0.7071 0 0.7071 1.4142 0 1.4142
  [4,16,0.7654,0,1.8478,0.3827,0,0.9239,0.7071,0,0.7071,1.4142,0,1.4142],
// 4 16 0 0 2 0 0 1 0.3827 0 0.9239 0.7654 0 1.8478
  [4,16,0,0,2,0,0,1,0.3827,0,0.9239,0.7654,0,1.8478],
// 0
];
makepoly(ldraw_lib__4_4ring1(), line=0.2);
// file: ../p/4-4edge.scad
use <../lib.scad>
function ldraw_lib__4_4edge() = [
// 0 Circle 1.0
// 0 Name: 4-4edge.dat
// 0 Author: James Jessiman
// 0 !LDRAW_ORG Primitive UPDATE 2017-01
// 0 !LICENSE Licensed under CC BY 2.0 and CC BY 4.0 : see CAreadme.txt
// 
// 0 BFC CERTIFY CCW
  [0,"BFC","CERTIFY"],
  [0,"BFC","CCW"],
// 
// 0 !HISTORY 1998-12-15 [PTadmin] Official Update 1998-10
// 0 !HISTORY 2005-12-28 [PTadmin] Official Update 2005-01
// 0 !HISTORY 2007-06-24 [PTadmin] Header formatted for Contributor Agreement
// 0 !HISTORY 2008-07-01 [PTadmin] Official Update 2008-01
// 0 !HISTORY 2017-01-15 [Steffen] BFCed
// 0 !HISTORY 2017-12-30 [PTadmin] Official Update 2017-01
// 
// 
// 2 24 1 0 0 0.9239 0 0.3827
  [2,24,1,0,0,0.9239,0,0.3827],
// 2 24 0.9239 0 0.3827 0.7071 0 0.7071
  [2,24,0.9239,0,0.3827,0.7071,0,0.7071],
// 2 24 0.7071 0 0.7071 0.3827 0 0.9239
  [2,24,0.7071,0,0.7071,0.3827,0,0.9239],
// 2 24 0.3827 0 0.9239 0 0 1
  [2,24,0.3827,0,0.9239,0,0,1],
// 2 24 0 0 1 -0.3827 0 0.9239
  [2,24,0,0,1,-0.3827,0,0.9239],
// 2 24 -0.3827 0 0.9239 -0.7071 0 0.7071
  [2,24,-0.3827,0,0.9239,-0.7071,0,0.7071],
// 2 24 -0.7071 0 0.7071 -0.9239 0 0.3827
  [2,24,-0.7071,0,0.7071,-0.9239,0,0.3827],
// 2 24 -0.9239 0 0.3827 -1 0 -0
  [2,24,-0.9239,0,0.3827,-1,0,-0],
// 2 24 -1 0 -0 -0.9239 0 -0.3827
  [2,24,-1,0,-0,-0.9239,0,-0.3827],
// 2 24 -0.9239 0 -0.3827 -0.7071 0 -0.7071
  [2,24,-0.9239,0,-0.3827,-0.7071,0,-0.7071],
// 2 24 -0.7071 0 -0.7071 -0.3827 0 -0.9239
  [2,24,-0.7071,0,-0.7071,-0.3827,0,-0.9239],
// 2 24 -0.3827 0 -0.9239 0 0 -1
  [2,24,-0.3827,0,-0.9239,0,0,-1],
// 2 24 0 0 -1 0.3827 0 -0.9239
  [2,24,0,0,-1,0.3827,0,-0.9239],
// 2 24 0.3827 0 -0.9239 0.7071 0 -0.7071
  [2,24,0.3827,0,-0.9239,0.7071,0,-0.7071],
// 2 24 0.7071 0 -0.7071 0.9239 0 -0.3827
  [2,24,0.7071,0,-0.7071,0.9239,0,-0.3827],
// 2 24 0.9239 0 -0.3827 1 0 0
  [2,24,0.9239,0,-0.3827,1,0,0],
];
makepoly(ldraw_lib__4_4edge(), line=0.2);
// file: ../p/4-4cylo.scad
use <../lib.scad>
use <4-4cyli.scad>
use <4-4edge.scad>
function ldraw_lib__4_4cylo() = [
// 0 Cylinder Open 1.0
// 0 Name: 4-4cylo.dat
// 0 Author: Mark Kennedy [mkennedy]
// 0 !LDRAW_ORG Primitive UPDATE 2010-01
// 0 !LICENSE Licensed under CC BY 2.0 and CC BY 4.0 : see CAreadme.txt
// 
// 0 BFC CERTIFY CCW
  [0,"BFC","CERTIFY"],
  [0,"BFC","CCW"],
// 
// 0 !HISTORY 2010-04-05 [PTadmin] Official Update 2010-01
// 
// 
// 1 16 0 0 0 1 0 0 0 1 0 0 0 1 4-4edge.dat
  [1,16,0,0,0,1,0,0,0,1,0,0,0,1, ldraw_lib__4_4edge()],
// 1 16 0 1 0 1 0 0 0 1 0 0 0 1 4-4edge.dat
  [1,16,0,1,0,1,0,0,0,1,0,0,0,1, ldraw_lib__4_4edge()],
// 1 16 0 0 0 1 0 0 0 1 0 0 0 1 4-4cyli.dat
  [1,16,0,0,0,1,0,0,0,1,0,0,0,1, ldraw_lib__4_4cyli()],
// 0
];
makepoly(ldraw_lib__4_4cylo(), line=0.2);
// file: ../p/4-4cyli.scad
use <../lib.scad>
function ldraw_lib__4_4cyli() = [
// 0 Cylinder 1.0
// 0 Name: 4-4cyli.dat
// 0 Author: James Jessiman
// 0 !LDRAW_ORG Primitive UPDATE 2005-01
// 0 !LICENSE Licensed under CC BY 2.0 and CC BY 4.0 : see CAreadme.txt
// 
// 0 BFC CERTIFY CCW
  [0,"BFC","CERTIFY"],
  [0,"BFC","CCW"],
// 
// 0 !HISTORY 1998-12-15 [PTadmin] Official Update 1998-10
// 0 !HISTORY 2002-03-23 [sbliss] Added BFC statement; merged headers from files in distributions LDraw 0.27 and Complete.
// 0 !HISTORY 2002-04-25 [PTadmin] Official Update 2002-02
// 0 !HISTORY 2004-12-14 [guyvivan] BFC CCW
// 0 !HISTORY 2005-12-28 [PTadmin] Official Update 2005-01
// 0 !HISTORY 2007-06-24 [PTadmin] Header formatted for Contributor Agreement
// 0 !HISTORY 2008-07-01 [PTadmin] Official Update 2008-01
// 
// 
// 4 16 1 1 0 0.9239 1 0.3827 0.9239 0 0.3827 1 0 0
  [4,16,1,1,0,0.9239,1,0.3827,0.9239,0,0.3827,1,0,0],
// 5 24 1 0 0 1 1 0 0.9239 0 0.3827 0.9239 0 -0.3827
  [5,24,1,0,0,1,1,0,0.9239,0,0.3827,0.9239,0,-0.3827],
// 4 16 0.9239 1 0.3827 0.7071 1 0.7071 0.7071 0 0.7071 0.9239 0 0.3827
  [4,16,0.9239,1,0.3827,0.7071,1,0.7071,0.7071,0,0.7071,0.9239,0,0.3827],
// 5 24 0.9239 0 0.3827 0.9239 1 0.3827 0.7071 0 0.7071 1 0 0
  [5,24,0.9239,0,0.3827,0.9239,1,0.3827,0.7071,0,0.7071,1,0,0],
// 4 16 0.7071 1 0.7071 0.3827 1 0.9239 0.3827 0 0.9239 0.7071 0 0.7071
  [4,16,0.7071,1,0.7071,0.3827,1,0.9239,0.3827,0,0.9239,0.7071,0,0.7071],
// 5 24 0.7071 0 0.7071 0.7071 1 0.7071 0.3827 0 0.9239 0.9239 0 0.3827
  [5,24,0.7071,0,0.7071,0.7071,1,0.7071,0.3827,0,0.9239,0.9239,0,0.3827],
// 4 16 0.3827 1 0.9239 0 1 1 0 0 1 0.3827 0 0.9239
  [4,16,0.3827,1,0.9239,0,1,1,0,0,1,0.3827,0,0.9239],
// 5 24 0.3827 0 0.9239 0.3827 1 0.9239 0 0 1 0.7071 0 0.7071
  [5,24,0.3827,0,0.9239,0.3827,1,0.9239,0,0,1,0.7071,0,0.7071],
// 4 16 0 1 1 -0.3827 1 0.9239 -0.3827 0 0.9239 0 0 1
  [4,16,0,1,1,-0.3827,1,0.9239,-0.3827,0,0.9239,0,0,1],
// 5 24 0 0 1 0 1 1 -0.3827 0 0.9239 0.3827 0 0.9239
  [5,24,0,0,1,0,1,1,-0.3827,0,0.9239,0.3827,0,0.9239],
// 4 16 -0.3827 1 0.9239 -0.7071 1 0.7071 -0.7071 0 0.7071 -0.3827 0 0.9239
  [4,16,-0.3827,1,0.9239,-0.7071,1,0.7071,-0.7071,0,0.7071,-0.3827,0,0.9239],
// 5 24 -0.3827 0 0.9239 -0.3827 1 0.9239 -0.7071 0 0.7071 0 0 1
  [5,24,-0.3827,0,0.9239,-0.3827,1,0.9239,-0.7071,0,0.7071,0,0,1],
// 4 16 -0.7071 1 0.7071 -0.9239 1 0.3827 -0.9239 0 0.3827 -0.7071 0 0.7071
  [4,16,-0.7071,1,0.7071,-0.9239,1,0.3827,-0.9239,0,0.3827,-0.7071,0,0.7071],
// 5 24 -0.7071 0 0.7071 -0.7071 1 0.7071 -0.9239 0 0.3827 -0.3827 0 0.9239
  [5,24,-0.7071,0,0.7071,-0.7071,1,0.7071,-0.9239,0,0.3827,-0.3827,0,0.9239],
// 4 16 -0.9239 1 0.3827 -1 1 0 -1 0 0 -0.9239 0 0.3827
  [4,16,-0.9239,1,0.3827,-1,1,0,-1,0,0,-0.9239,0,0.3827],
// 5 24 -0.9239 0 0.3827 -0.9239 1 0.3827 -1 0 0 -0.7071 0 0.7071
  [5,24,-0.9239,0,0.3827,-0.9239,1,0.3827,-1,0,0,-0.7071,0,0.7071],
// 4 16 -1 1 0 -0.9239 1 -0.3827 -0.9239 0 -0.3827 -1 0 0
  [4,16,-1,1,0,-0.9239,1,-0.3827,-0.9239,0,-0.3827,-1,0,0],
// 5 24 -1 0 0 -1 1 0 -0.9239 0 -0.3827 -0.9239 0 0.3827
  [5,24,-1,0,0,-1,1,0,-0.9239,0,-0.3827,-0.9239,0,0.3827],
// 4 16 -0.9239 1 -0.3827 -0.7071 1 -0.7071 -0.7071 0 -0.7071 -0.9239 0 -0.3827
  [4,16,-0.9239,1,-0.3827,-0.7071,1,-0.7071,-0.7071,0,-0.7071,-0.9239,0,-0.3827],
// 5 24 -0.9239 0 -0.3827 -0.9239 1 -0.3827 -0.7071 0 -0.7071 -1 0 0
  [5,24,-0.9239,0,-0.3827,-0.9239,1,-0.3827,-0.7071,0,-0.7071,-1,0,0],
// 4 16 -0.7071 1 -0.7071 -0.3827 1 -0.9239 -0.3827 0 -0.9239 -0.7071 0 -0.7071
  [4,16,-0.7071,1,-0.7071,-0.3827,1,-0.9239,-0.3827,0,-0.9239,-0.7071,0,-0.7071],
// 5 24 -0.7071 0 -0.7071 -0.7071 1 -0.7071 -0.3827 0 -0.9239 -0.9239 0 -0.3827
  [5,24,-0.7071,0,-0.7071,-0.7071,1,-0.7071,-0.3827,0,-0.9239,-0.9239,0,-0.3827],
// 4 16 -0.3827 1 -0.9239 0 1 -1 0 0 -1 -0.3827 0 -0.9239
  [4,16,-0.3827,1,-0.9239,0,1,-1,0,0,-1,-0.3827,0,-0.9239],
// 5 24 -0.3827 0 -0.9239 -0.3827 1 -0.9239 0 0 -1 -0.7071 0 -0.7071
  [5,24,-0.3827,0,-0.9239,-0.3827,1,-0.9239,0,0,-1,-0.7071,0,-0.7071],
// 4 16 0 1 -1 0.3827 1 -0.9239 0.3827 0 -0.9239 0 0 -1
  [4,16,0,1,-1,0.3827,1,-0.9239,0.3827,0,-0.9239,0,0,-1],
// 5 24 0 0 -1 0 1 -1 0.3827 0 -0.9239 -0.3827 0 -0.9239
  [5,24,0,0,-1,0,1,-1,0.3827,0,-0.9239,-0.3827,0,-0.9239],
// 4 16 0.3827 1 -0.9239 0.7071 1 -0.7071 0.7071 0 -0.7071 0.3827 0 -0.9239
  [4,16,0.3827,1,-0.9239,0.7071,1,-0.7071,0.7071,0,-0.7071,0.3827,0,-0.9239],
// 5 24 0.3827 0 -0.9239 0.3827 1 -0.9239 0.7071 0 -0.7071 0 0 -1
  [5,24,0.3827,0,-0.9239,0.3827,1,-0.9239,0.7071,0,-0.7071,0,0,-1],
// 4 16 0.7071 1 -0.7071 0.9239 1 -0.3827 0.9239 0 -0.3827 0.7071 0 -0.7071
  [4,16,0.7071,1,-0.7071,0.9239,1,-0.3827,0.9239,0,-0.3827,0.7071,0,-0.7071],
// 5 24 0.7071 0 -0.7071 0.7071 1 -0.7071 0.9239 0 -0.3827 0.3827 0 -0.9239
  [5,24,0.7071,0,-0.7071,0.7071,1,-0.7071,0.9239,0,-0.3827,0.3827,0,-0.9239],
// 4 16 0.9239 1 -0.3827 1 1 0 1 0 0 0.9239 0 -0.3827
  [4,16,0.9239,1,-0.3827,1,1,0,1,0,0,0.9239,0,-0.3827],
// 5 24 0.9239 0 -0.3827 0.9239 1 -0.3827 1 0 0 0.7071 0 -0.7071
  [5,24,0.9239,0,-0.3827,0.9239,1,-0.3827,1,0,0,0.7071,0,-0.7071],
// 0
];
makepoly(ldraw_lib__4_4cyli(), line=0.2);
// file: ../p/4-4cylc.scad
use <../lib.scad>
use <4-4cyli.scad>
use <4-4disc.scad>
use <4-4edge.scad>
function ldraw_lib__4_4cylc() = [
// 0 Cylinder Closed 1.0
// 0 Name: 4-4cylc.dat
// 0 Author: Alex Taylor [anathema]
// 0 !LDRAW_ORG Primitive UPDATE 2009-02
// 0 !LICENSE Licensed under CC BY 2.0 and CC BY 4.0 : see CAreadme.txt
// 
// 0 BFC CERTIFY CCW
  [0,"BFC","CERTIFY"],
  [0,"BFC","CCW"],
// 
// 0 !HISTORY 2008-12-29 [cwdee] Removed one disc
// 0 !HISTORY 2009-09-03 [PTadmin] Official Update 2009-02
// 
// 
// 1 16 0 0 0 1 0 0 0 1 0 0 0 1 4-4edge.dat
  [1,16,0,0,0,1,0,0,0,1,0,0,0,1, ldraw_lib__4_4edge()],
// 1 16 0 1 0 1 0 0 0 1 0 0 0 1 4-4edge.dat
  [1,16,0,1,0,1,0,0,0,1,0,0,0,1, ldraw_lib__4_4edge()],
// 1 16 0 0 0 1 0 0 0 1 0 0 0 1 4-4disc.dat
  [1,16,0,0,0,1,0,0,0,1,0,0,0,1, ldraw_lib__4_4disc()],
// 1 16 0 0 0 1 0 0 0 1 0 0 0 1 4-4cyli.dat
  [1,16,0,0,0,1,0,0,0,1,0,0,0,1, ldraw_lib__4_4cyli()],
// 0
];
makepoly(ldraw_lib__4_4cylc(), line=0.2);
// file: 3957a.scad
use <../lib.scad>
use <../p/4-4cylc.scad>
use <../p/4-4cyli.scad>
use <../p/4-4cylo.scad>
use <../p/4-4edge.scad>
use <../p/4-4ring1.scad>
use <../p/4-4ring2.scad>
use <../p/4-4ring3.scad>
use <../p/4-8sphe.scad>
use <../p/stud4a.scad>
function ldraw_lib__3957a() = [
// 0 Antenna  4H with Rounded Top
// 0 Name: 3957a.dat
// 0 Author: James Jessiman
// 0 !LDRAW_ORG Part UPDATE 2015-01
// 0 !LICENSE Licensed under CC BY 2.0 and CC BY 4.0 : see CAreadme.txt
// 
// 0 BFC CERTIFY CCW
  [0,"BFC","CERTIFY"],
  [0,"BFC","CCW"],
// 
// 0 !HISTORY 1998-06-20 [PTadmin] Official Update 1998-06
// 0 !HISTORY 2003-08-01 [PTadmin] Official Update 2003-02
// 0 !HISTORY 2003-08-06 [jriley] BFCed, added inner detail
// 0 !HISTORY 2003-12-19 [PTadmin] Official Update 2003-03
// 0 !HISTORY 2003-12-20 [Steffen] fixed BFC error
// 0 !HISTORY 2004-03-02 [PTadmin] Official Update 2004-01
// 0 !HISTORY 2007-06-30 [PTadmin] Header formatted for Contributor Agreement
// 0 !HISTORY 2008-07-01 [PTadmin] Official Update 2008-01
// 0 !HISTORY 2012-03-13 [PTadmin] Renamed from 3957
// 0 !HISTORY 2012-03-30 [PTadmin] Official Update 2012-01
// 0 !HISTORY 2015-02-10 [MagFors] Redesign without peghole.dat
// 0 !HISTORY 2015-10-11 [PTadmin] Official Update 2015-01
// 
// 
// 1 16 0 -84 0 4 0 0 0 -4 0 0 0 4 4-8sphe.dat
  [1,16,0,-84,0,4,0,0,0,-4,0,0,0,4, ldraw_lib__4_8sphe()],
// 1 16 0 4 0 1 0 0 0 -1 0 0 0 1 stud4a.dat
  [1,16,0,4,0,1,0,0,0,-1,0,0,0,1, ldraw_lib__stud4a()],
// 1 16 0 4 0 6 0 0 0 1 0 0 0 6 4-4edge.dat
  [1,16,0,4,0,6,0,0,0,1,0,0,0,6, ldraw_lib__4_4edge()],
// 1 16 0 4 0 3 0 0 0 -1 0 0 0 3 4-4ring1.dat
  [1,16,0,4,0,3,0,0,0,-1,0,0,0,3, ldraw_lib__4_4ring1()],
// 0 BFC INVERTNEXT
  [0,"BFC","INVERTNEXT"],
// 1 16 0 0 0 3 0 0 0 4 0 0 0 3 4-4cylc.dat
  [1,16,0,0,0,3,0,0,0,4,0,0,0,3, ldraw_lib__4_4cylc()],
// 1 16 0 0 0 8 0 0 0 1 0 0 0 8 4-4edge.dat
  [1,16,0,0,0,8,0,0,0,1,0,0,0,8, ldraw_lib__4_4edge()],
// 1 16 0 0 0 8 0 0 0 4 0 0 0 8 4-4cyli.dat
  [1,16,0,0,0,8,0,0,0,4,0,0,0,8, ldraw_lib__4_4cyli()],
// 1 16 0 0 0 2 0 0 0 1 0 0 0 2 4-4ring3.dat
  [1,16,0,0,0,2,0,0,0,1,0,0,0,2, ldraw_lib__4_4ring3()],
// 1 16 0 -4 0 6 0 0 0 4 0 0 0 6 4-4cylo.dat
  [1,16,0,-4,0,6,0,0,0,4,0,0,0,6, ldraw_lib__4_4cylo()],
// 1 16 0 -4 0 4 0 0 0 1 0 0 0 4 4-4edge.dat
  [1,16,0,-4,0,4,0,0,0,1,0,0,0,4, ldraw_lib__4_4edge()],
// 1 16 0 -4 0 2 0 0 0 1 0 0 0 2 4-4ring2.dat
  [1,16,0,-4,0,2,0,0,0,1,0,0,0,2, ldraw_lib__4_4ring2()],
// 1 16 0 -84 0 4 0 0 0 80 0 0 0 4 4-4cyli.dat
  [1,16,0,-84,0,4,0,0,0,80,0,0,0,4, ldraw_lib__4_4cyli()],
];
makepoly(ldraw_lib__3957a(), line=0.2);
// file: 3957.scad
use <../lib.scad>
use <3957a.scad>
function ldraw_lib__3957() = [
// 0 ~Moved to 3957a
// 0 Name: 3957.dat
// 0 Author: [PTadmin]
// 0 !LDRAW_ORG Part UPDATE 2012-01
// 0 !LICENSE Licensed under CC BY 4.0 : see CAreadme.txt
// 
// 0 BFC CERTIFY CCW
  [0,"BFC","CERTIFY"],
  [0,"BFC","CCW"],
// 
// 0 !HISTORY 2012-03-30 [PTadmin] Official Update 2012-01
// 
// 
// 0 // Antenna 4H
// 1 16 0 0 0 1 0 0 0 1 0 0 0 1 3957a.dat
  [1,16,0,0,0,1,0,0,0,1,0,0,0,1, ldraw_lib__3957a()],
];
makepoly(ldraw_lib__3957(), line=0.2);
// main file
use <../lib.scad>
use <3957.scad>
function ldraw_lib__395701() = [
// 0 ~_Antenna 4H White (Obsolete)
// 0 Name: 395701.dat
// 0 Author: Michael Heidemann [mikeheide]
// 0 !LDRAW_ORG Part Physical_Colour UPDATE 2019-02
// 0 !LICENSE Licensed under CC BY 2.0 and CC BY 4.0 : see CAreadme.txt
// 
// 0 BFC CERTIFY CCW
  [0,"BFC","CERTIFY"],
  [0,"BFC","CCW"],
// 
// 0 !HISTORY 2010-12-31 [PTadmin] Official Update 2010-03
// 0 !HISTORY 2019-07-24 [Holly-Wood] Obsoleted per decision not to include physical colour parts
// 0 !HISTORY 2019-09-09 [PTadmin] Official Update 2019-02
// 
// 
// 0 // This file is a "shortcut" with the correct number for the actual
// 0 // colouring of the part (White).
// 
// 1 15 0 0 0 1 0 0 0 1 0 0 0 1 3957.dat
  [1,15,0,0,0,1,0,0,0,1,0,0,0,1, ldraw_lib__3957()],
];
makepoly(ldraw_lib__395701(), line=0.2);
